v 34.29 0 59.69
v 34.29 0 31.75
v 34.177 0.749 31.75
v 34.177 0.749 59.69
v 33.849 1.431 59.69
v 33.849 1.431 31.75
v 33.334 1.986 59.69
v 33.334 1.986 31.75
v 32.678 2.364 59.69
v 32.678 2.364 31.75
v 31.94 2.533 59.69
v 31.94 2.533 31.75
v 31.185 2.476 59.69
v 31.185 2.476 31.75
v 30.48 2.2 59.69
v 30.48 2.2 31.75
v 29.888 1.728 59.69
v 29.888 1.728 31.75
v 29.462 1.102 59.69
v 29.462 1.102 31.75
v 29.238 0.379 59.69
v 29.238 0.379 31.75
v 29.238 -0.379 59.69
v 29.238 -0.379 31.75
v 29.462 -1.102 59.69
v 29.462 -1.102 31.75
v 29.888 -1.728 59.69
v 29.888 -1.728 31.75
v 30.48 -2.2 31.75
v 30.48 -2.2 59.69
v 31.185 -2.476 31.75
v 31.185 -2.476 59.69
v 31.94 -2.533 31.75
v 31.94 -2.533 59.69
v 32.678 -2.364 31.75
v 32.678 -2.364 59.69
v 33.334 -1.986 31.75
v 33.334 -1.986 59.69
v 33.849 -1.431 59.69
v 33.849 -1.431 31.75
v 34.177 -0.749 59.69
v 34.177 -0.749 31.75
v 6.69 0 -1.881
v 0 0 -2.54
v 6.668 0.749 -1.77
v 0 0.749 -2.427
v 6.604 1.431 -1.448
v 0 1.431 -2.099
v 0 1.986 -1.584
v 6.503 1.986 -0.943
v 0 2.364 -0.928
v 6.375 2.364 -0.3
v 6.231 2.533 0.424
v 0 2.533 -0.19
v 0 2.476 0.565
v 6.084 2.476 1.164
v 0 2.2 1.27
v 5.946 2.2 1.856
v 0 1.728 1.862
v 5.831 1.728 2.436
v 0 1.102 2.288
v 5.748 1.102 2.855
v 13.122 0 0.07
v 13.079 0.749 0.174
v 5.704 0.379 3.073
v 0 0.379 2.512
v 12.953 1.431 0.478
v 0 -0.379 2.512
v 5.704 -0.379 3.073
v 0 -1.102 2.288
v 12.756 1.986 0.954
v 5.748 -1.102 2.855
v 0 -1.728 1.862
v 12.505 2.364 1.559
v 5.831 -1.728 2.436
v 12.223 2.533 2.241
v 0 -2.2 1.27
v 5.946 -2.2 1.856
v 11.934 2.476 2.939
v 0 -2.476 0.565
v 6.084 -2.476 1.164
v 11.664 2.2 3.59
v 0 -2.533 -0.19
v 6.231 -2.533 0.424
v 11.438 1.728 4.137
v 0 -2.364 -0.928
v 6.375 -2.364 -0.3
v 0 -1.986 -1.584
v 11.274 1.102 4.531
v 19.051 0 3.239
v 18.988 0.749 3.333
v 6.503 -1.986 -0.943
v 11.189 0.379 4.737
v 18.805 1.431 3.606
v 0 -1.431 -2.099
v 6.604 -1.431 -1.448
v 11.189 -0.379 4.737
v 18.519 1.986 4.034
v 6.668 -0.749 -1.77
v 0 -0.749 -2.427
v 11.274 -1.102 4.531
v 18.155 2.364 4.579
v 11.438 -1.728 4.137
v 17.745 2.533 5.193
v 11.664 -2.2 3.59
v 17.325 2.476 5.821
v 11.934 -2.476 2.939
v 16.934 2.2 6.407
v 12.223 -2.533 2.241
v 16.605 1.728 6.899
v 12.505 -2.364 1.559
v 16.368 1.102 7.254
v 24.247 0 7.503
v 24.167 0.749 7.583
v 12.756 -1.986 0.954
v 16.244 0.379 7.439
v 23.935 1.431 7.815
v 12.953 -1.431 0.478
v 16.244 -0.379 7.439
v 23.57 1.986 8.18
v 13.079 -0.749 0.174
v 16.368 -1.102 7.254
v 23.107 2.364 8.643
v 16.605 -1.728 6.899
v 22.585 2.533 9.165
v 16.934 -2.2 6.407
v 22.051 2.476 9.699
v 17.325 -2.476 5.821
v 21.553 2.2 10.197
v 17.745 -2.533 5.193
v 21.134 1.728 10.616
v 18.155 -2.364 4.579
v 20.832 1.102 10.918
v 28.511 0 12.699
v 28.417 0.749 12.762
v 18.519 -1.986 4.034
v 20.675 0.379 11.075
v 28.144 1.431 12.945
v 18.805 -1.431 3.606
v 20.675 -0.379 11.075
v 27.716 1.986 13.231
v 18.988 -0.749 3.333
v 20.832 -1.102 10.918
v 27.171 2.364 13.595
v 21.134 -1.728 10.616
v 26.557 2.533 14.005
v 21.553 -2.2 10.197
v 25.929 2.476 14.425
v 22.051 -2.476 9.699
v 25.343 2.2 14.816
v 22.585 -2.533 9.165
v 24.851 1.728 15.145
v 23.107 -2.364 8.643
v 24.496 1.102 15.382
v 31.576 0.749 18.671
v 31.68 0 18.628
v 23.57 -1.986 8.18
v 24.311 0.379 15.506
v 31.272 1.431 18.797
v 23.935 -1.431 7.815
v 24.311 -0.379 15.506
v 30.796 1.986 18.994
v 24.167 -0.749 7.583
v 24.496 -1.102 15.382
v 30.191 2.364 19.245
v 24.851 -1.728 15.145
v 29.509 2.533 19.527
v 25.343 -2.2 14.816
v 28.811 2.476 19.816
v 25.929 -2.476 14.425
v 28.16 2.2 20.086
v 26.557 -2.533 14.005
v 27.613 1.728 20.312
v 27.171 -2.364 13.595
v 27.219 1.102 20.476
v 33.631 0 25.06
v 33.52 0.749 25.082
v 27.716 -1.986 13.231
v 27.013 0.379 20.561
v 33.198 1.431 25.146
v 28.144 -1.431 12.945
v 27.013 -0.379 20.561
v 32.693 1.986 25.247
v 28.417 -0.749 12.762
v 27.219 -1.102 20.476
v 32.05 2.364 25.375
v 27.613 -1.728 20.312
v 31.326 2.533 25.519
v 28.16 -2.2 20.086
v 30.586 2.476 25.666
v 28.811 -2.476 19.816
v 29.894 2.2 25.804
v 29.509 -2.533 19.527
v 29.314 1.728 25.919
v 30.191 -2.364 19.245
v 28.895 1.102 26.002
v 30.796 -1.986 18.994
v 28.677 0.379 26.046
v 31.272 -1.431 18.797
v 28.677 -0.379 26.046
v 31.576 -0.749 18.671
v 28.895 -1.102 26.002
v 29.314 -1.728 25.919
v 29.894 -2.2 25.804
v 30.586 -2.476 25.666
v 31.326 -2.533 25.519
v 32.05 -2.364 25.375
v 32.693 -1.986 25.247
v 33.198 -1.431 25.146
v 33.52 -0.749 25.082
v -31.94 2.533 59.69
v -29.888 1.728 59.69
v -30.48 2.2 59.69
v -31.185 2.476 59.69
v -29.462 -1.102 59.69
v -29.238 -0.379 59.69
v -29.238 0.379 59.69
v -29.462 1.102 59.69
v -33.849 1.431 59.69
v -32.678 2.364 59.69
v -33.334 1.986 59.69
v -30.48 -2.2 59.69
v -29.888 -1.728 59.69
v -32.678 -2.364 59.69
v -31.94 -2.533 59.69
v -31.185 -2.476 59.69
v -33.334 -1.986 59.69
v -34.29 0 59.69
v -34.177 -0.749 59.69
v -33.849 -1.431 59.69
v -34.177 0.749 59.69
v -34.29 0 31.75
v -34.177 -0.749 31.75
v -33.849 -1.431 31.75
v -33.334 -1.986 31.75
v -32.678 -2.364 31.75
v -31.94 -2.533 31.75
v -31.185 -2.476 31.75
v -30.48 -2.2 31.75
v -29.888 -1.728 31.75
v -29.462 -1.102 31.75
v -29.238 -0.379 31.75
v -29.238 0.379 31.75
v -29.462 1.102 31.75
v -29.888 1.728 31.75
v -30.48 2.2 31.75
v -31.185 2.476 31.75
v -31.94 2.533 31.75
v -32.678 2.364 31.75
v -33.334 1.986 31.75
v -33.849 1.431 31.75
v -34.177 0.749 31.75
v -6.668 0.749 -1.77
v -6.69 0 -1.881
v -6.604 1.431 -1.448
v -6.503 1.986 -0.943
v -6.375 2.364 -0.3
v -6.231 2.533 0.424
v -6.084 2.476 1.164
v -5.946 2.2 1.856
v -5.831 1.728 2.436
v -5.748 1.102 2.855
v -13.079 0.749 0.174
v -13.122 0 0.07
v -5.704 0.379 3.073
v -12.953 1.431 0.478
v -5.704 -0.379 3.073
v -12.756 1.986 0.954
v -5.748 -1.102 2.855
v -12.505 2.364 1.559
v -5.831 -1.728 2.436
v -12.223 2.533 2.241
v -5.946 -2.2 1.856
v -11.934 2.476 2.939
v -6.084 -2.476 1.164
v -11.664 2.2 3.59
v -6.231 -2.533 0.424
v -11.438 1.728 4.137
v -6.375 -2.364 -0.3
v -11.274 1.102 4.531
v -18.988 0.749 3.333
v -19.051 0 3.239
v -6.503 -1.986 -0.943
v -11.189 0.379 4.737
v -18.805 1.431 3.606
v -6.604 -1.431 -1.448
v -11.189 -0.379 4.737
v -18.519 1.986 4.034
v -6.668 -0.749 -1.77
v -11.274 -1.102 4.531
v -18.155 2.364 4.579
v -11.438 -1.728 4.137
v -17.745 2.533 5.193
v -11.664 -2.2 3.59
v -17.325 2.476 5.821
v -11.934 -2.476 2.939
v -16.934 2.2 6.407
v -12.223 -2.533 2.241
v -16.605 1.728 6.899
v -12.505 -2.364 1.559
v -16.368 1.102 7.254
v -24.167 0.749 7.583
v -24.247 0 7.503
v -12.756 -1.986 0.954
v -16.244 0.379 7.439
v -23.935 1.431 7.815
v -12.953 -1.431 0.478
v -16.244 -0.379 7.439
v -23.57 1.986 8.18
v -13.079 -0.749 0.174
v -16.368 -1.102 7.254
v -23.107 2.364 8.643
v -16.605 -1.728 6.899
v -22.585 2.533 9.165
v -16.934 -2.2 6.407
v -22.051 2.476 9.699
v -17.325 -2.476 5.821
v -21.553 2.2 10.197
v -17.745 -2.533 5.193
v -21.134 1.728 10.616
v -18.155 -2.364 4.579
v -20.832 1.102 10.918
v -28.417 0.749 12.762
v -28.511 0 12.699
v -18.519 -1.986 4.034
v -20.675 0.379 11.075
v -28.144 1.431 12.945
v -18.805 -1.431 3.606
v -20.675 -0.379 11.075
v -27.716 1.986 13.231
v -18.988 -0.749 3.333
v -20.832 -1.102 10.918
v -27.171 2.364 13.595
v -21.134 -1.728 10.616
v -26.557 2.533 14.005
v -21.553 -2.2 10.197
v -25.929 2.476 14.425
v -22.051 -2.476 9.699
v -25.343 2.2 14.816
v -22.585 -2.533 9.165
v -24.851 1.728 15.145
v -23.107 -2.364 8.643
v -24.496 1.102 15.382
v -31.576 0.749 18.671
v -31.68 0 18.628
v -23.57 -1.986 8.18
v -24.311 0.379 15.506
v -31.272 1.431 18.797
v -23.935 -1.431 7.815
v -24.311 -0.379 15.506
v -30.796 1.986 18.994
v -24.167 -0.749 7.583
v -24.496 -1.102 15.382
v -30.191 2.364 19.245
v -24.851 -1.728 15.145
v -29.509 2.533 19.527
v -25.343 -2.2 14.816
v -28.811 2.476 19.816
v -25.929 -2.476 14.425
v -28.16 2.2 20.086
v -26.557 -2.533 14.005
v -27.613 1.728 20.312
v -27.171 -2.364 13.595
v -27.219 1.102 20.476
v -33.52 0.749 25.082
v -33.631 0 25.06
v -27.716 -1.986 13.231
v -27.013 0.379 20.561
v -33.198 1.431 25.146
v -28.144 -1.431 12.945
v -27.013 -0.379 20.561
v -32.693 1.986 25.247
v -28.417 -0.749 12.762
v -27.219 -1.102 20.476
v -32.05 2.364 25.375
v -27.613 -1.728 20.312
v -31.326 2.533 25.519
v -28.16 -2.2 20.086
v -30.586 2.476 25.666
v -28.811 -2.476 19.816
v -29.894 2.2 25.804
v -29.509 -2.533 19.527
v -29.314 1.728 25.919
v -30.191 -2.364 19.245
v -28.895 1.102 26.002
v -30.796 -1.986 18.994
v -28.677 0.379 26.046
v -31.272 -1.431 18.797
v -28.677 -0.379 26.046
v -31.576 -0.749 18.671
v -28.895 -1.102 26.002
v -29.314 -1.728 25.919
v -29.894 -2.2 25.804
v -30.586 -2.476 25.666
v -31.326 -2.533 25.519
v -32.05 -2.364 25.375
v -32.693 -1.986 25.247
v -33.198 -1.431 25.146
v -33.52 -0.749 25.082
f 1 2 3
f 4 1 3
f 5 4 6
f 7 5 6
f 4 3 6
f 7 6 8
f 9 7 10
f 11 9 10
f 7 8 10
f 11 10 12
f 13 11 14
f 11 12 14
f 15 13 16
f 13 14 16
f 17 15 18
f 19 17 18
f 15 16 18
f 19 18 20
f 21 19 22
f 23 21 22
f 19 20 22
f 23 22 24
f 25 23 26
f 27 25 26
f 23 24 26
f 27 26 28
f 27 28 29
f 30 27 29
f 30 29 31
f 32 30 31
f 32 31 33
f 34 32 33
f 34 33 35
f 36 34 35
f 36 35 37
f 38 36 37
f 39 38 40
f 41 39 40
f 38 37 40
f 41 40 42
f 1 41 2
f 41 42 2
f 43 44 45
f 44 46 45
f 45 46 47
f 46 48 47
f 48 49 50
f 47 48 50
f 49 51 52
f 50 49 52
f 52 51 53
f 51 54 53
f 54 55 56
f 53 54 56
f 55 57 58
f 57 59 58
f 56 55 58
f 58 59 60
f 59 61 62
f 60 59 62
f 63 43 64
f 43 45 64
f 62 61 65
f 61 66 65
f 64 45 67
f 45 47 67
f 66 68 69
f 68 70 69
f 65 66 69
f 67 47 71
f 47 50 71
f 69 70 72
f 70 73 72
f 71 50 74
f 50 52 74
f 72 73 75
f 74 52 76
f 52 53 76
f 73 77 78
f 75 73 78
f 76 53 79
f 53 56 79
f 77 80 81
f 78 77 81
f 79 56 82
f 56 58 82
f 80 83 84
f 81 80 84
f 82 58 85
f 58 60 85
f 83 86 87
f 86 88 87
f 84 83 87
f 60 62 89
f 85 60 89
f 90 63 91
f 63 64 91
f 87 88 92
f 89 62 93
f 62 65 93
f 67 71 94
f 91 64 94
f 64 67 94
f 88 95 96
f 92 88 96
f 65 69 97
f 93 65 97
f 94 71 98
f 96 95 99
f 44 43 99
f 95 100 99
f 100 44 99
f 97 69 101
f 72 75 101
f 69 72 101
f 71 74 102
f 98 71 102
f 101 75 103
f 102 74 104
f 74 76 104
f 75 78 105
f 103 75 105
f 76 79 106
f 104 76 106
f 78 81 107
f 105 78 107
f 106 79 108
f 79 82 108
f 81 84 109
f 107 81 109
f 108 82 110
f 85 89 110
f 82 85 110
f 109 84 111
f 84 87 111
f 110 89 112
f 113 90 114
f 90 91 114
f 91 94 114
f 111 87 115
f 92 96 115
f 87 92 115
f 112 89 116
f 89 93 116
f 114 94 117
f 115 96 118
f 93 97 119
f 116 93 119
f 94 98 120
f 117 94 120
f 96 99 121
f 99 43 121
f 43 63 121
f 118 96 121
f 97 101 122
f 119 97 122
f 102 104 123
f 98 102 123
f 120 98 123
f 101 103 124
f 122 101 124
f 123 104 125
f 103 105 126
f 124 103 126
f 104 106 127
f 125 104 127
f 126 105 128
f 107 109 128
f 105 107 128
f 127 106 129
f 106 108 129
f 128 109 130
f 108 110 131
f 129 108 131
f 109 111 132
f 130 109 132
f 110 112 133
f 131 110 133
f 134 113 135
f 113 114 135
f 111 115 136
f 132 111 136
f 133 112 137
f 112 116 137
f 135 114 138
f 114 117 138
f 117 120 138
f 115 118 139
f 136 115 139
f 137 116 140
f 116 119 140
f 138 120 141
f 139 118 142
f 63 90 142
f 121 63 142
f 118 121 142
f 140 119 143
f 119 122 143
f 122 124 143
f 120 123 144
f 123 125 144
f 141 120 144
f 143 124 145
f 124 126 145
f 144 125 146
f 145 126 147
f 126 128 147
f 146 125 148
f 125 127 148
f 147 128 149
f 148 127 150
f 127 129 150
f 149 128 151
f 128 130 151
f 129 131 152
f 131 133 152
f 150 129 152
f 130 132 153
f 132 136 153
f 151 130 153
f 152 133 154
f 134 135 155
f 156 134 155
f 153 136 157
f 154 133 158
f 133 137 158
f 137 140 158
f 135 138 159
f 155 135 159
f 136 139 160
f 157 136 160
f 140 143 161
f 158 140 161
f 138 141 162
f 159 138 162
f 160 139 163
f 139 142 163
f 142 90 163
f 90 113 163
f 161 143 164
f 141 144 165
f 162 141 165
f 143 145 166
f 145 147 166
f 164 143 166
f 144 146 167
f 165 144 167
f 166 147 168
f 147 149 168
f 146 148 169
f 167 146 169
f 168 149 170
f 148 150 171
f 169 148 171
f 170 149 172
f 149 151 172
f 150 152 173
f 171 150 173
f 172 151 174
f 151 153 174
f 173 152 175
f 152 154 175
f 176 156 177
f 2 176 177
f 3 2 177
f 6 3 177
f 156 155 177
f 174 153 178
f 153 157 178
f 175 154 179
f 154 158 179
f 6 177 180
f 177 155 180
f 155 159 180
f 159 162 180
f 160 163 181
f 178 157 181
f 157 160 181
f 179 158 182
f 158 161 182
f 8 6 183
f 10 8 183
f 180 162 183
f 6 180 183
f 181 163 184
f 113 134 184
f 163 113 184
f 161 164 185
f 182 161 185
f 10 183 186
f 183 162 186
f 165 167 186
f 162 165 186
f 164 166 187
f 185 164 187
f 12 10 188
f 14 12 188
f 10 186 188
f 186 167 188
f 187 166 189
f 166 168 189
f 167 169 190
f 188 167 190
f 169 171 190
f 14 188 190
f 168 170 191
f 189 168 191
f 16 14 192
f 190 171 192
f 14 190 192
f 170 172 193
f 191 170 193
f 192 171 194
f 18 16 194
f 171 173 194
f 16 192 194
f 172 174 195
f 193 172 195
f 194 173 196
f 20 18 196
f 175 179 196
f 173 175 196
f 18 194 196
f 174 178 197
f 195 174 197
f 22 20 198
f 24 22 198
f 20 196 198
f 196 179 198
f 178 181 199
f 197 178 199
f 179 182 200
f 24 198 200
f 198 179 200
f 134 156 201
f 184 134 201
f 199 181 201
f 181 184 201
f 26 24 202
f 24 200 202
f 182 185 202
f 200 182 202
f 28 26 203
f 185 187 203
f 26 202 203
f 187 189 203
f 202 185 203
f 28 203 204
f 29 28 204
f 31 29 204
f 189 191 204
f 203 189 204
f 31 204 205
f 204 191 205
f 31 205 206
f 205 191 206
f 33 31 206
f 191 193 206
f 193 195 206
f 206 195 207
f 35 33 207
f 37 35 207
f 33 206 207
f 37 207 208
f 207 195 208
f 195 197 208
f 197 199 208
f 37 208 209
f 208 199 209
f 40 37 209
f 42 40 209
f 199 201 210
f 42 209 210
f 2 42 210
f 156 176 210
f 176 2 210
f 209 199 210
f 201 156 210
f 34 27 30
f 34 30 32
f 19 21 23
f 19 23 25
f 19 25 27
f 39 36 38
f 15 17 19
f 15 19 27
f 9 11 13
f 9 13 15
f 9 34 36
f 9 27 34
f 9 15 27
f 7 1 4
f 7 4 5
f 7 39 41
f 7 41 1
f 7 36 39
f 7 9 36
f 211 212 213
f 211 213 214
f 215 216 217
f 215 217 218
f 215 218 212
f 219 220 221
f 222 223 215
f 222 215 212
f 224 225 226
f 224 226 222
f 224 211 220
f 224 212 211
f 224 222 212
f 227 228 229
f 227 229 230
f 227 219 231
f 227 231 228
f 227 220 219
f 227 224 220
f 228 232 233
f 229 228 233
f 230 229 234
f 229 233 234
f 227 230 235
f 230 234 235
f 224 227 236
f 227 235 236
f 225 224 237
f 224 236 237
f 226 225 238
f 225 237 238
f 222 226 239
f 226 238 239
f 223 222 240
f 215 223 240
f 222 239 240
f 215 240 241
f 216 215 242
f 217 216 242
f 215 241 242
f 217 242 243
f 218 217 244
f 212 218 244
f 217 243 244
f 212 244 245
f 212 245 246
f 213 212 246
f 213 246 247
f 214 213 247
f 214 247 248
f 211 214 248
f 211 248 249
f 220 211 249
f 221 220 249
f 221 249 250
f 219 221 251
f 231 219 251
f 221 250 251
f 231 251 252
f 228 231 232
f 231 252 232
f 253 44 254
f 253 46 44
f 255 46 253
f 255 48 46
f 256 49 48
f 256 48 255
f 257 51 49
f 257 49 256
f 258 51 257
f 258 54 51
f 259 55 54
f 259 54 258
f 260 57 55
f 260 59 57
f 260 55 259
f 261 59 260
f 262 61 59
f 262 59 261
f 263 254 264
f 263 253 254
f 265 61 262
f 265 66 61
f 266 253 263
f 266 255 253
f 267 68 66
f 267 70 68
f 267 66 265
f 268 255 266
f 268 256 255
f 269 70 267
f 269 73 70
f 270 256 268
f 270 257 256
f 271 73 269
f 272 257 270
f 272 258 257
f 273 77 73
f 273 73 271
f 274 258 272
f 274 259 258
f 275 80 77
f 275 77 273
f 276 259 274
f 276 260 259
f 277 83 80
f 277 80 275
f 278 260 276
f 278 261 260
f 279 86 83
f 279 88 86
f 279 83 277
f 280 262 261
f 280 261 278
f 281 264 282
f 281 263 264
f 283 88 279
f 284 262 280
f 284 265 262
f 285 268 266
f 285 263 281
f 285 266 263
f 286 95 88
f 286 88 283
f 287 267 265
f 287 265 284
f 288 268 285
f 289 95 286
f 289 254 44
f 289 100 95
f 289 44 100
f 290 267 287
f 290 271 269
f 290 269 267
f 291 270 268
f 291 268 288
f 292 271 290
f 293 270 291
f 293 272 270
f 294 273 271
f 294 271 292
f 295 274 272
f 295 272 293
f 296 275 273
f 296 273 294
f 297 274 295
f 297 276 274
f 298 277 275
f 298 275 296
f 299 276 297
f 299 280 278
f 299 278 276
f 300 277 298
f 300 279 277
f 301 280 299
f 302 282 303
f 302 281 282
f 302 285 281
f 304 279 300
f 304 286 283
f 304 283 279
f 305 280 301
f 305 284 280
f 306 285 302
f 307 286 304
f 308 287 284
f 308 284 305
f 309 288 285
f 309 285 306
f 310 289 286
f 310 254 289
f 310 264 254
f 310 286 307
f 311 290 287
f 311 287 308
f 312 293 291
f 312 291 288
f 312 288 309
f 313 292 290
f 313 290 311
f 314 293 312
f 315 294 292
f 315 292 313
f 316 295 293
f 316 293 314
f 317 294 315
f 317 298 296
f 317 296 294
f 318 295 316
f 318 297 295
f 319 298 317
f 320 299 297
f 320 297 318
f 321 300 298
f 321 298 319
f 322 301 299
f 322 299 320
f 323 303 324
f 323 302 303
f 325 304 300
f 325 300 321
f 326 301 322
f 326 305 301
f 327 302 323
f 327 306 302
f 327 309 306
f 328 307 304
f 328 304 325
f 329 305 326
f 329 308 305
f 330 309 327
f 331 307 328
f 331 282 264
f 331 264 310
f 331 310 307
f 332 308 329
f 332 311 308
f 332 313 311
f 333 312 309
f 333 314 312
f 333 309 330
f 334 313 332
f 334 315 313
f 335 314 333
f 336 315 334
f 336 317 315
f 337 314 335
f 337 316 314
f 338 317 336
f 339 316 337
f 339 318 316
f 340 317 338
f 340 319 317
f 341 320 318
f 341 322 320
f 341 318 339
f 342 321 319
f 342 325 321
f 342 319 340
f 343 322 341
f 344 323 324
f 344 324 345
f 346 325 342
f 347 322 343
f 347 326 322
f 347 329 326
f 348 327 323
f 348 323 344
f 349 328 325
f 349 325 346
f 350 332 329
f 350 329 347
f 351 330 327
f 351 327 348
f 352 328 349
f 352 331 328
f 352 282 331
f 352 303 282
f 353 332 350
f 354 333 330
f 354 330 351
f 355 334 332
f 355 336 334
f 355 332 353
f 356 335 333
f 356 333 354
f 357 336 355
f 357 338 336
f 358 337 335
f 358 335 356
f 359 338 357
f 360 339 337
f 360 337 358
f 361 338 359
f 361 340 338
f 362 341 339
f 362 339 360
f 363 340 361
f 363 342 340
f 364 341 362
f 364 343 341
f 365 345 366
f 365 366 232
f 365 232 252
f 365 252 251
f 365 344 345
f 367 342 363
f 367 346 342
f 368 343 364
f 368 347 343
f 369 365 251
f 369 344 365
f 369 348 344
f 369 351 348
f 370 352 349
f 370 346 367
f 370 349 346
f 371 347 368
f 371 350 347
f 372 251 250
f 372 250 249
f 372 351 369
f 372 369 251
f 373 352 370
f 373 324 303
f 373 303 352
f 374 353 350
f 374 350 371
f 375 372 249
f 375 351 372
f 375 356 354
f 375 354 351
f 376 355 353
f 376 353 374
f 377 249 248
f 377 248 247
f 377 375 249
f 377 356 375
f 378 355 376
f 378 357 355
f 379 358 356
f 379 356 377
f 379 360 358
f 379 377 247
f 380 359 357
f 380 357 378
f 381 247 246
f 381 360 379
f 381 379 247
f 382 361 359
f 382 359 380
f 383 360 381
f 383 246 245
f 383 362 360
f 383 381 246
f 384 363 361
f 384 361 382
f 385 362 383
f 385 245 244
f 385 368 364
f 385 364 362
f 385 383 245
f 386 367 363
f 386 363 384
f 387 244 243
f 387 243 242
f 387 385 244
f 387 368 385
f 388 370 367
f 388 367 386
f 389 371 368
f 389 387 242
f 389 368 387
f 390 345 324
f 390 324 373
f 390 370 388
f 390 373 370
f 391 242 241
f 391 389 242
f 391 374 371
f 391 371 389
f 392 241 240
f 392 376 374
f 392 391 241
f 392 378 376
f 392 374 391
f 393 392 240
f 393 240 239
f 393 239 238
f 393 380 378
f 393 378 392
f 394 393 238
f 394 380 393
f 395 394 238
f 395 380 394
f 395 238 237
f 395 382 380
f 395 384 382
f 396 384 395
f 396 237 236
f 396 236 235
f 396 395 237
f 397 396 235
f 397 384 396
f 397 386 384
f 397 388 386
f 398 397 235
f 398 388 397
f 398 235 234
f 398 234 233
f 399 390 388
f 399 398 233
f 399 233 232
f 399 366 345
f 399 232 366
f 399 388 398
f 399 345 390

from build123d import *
from build123d.topology import SkipClean

# Parameters (mm, degrees)
SKETCH1_R                = 2.54
REVOLVE1_ANGLE           = 90
REVOLVE1_OTHER_WAY_ANGLE = 90
SKETCH2_R                = 2.54
BOSS_EXTRUDE1_DEPTH      = 27.94


with BuildPart() as part:
    # Sketch1 → Revolve1 (revolve)
    with BuildSketch(Plane(origin=(0, 0, 0), x_dir=(0, 0, -1), z_dir=(1, 0, 0))):
        Circle(SKETCH1_R)
    revolve(axis=Axis((0, -9.059790144, 31.75), (0, 1, 0)), revolution_arc=REVOLVE1_ANGLE)

    # Sketch1 → Revolve1 other way (revolve)
    with SkipClean():  # the faces are left unmerged after this step: merging them gives an invalid solid
        with BuildSketch(Plane(origin=(0, 0, 0), x_dir=(0, 0, -1), z_dir=(1, 0, 0))):
            Circle(SKETCH1_R)
        revolve(axis=Axis((0, -9.059790144, 31.75), (0, -1, 0)), revolution_arc=REVOLVE1_OTHER_WAY_ANGLE)

    # Sketch2 → Boss-Extrude1 (add)
    with SkipClean():  # the faces are left unmerged after this step: merging them gives an invalid solid
        with BuildSketch(Plane.XY.offset(31.75)):
            with Locations(Location((-31.75, 0, 0), (0, 0, 180))):
                Circle(SKETCH2_R)
            with Locations((31.75, 0)):
                Circle(SKETCH2_R)
        extrude(amount=BOSS_EXTRUDE1_DEPTH)


solid = part.part
